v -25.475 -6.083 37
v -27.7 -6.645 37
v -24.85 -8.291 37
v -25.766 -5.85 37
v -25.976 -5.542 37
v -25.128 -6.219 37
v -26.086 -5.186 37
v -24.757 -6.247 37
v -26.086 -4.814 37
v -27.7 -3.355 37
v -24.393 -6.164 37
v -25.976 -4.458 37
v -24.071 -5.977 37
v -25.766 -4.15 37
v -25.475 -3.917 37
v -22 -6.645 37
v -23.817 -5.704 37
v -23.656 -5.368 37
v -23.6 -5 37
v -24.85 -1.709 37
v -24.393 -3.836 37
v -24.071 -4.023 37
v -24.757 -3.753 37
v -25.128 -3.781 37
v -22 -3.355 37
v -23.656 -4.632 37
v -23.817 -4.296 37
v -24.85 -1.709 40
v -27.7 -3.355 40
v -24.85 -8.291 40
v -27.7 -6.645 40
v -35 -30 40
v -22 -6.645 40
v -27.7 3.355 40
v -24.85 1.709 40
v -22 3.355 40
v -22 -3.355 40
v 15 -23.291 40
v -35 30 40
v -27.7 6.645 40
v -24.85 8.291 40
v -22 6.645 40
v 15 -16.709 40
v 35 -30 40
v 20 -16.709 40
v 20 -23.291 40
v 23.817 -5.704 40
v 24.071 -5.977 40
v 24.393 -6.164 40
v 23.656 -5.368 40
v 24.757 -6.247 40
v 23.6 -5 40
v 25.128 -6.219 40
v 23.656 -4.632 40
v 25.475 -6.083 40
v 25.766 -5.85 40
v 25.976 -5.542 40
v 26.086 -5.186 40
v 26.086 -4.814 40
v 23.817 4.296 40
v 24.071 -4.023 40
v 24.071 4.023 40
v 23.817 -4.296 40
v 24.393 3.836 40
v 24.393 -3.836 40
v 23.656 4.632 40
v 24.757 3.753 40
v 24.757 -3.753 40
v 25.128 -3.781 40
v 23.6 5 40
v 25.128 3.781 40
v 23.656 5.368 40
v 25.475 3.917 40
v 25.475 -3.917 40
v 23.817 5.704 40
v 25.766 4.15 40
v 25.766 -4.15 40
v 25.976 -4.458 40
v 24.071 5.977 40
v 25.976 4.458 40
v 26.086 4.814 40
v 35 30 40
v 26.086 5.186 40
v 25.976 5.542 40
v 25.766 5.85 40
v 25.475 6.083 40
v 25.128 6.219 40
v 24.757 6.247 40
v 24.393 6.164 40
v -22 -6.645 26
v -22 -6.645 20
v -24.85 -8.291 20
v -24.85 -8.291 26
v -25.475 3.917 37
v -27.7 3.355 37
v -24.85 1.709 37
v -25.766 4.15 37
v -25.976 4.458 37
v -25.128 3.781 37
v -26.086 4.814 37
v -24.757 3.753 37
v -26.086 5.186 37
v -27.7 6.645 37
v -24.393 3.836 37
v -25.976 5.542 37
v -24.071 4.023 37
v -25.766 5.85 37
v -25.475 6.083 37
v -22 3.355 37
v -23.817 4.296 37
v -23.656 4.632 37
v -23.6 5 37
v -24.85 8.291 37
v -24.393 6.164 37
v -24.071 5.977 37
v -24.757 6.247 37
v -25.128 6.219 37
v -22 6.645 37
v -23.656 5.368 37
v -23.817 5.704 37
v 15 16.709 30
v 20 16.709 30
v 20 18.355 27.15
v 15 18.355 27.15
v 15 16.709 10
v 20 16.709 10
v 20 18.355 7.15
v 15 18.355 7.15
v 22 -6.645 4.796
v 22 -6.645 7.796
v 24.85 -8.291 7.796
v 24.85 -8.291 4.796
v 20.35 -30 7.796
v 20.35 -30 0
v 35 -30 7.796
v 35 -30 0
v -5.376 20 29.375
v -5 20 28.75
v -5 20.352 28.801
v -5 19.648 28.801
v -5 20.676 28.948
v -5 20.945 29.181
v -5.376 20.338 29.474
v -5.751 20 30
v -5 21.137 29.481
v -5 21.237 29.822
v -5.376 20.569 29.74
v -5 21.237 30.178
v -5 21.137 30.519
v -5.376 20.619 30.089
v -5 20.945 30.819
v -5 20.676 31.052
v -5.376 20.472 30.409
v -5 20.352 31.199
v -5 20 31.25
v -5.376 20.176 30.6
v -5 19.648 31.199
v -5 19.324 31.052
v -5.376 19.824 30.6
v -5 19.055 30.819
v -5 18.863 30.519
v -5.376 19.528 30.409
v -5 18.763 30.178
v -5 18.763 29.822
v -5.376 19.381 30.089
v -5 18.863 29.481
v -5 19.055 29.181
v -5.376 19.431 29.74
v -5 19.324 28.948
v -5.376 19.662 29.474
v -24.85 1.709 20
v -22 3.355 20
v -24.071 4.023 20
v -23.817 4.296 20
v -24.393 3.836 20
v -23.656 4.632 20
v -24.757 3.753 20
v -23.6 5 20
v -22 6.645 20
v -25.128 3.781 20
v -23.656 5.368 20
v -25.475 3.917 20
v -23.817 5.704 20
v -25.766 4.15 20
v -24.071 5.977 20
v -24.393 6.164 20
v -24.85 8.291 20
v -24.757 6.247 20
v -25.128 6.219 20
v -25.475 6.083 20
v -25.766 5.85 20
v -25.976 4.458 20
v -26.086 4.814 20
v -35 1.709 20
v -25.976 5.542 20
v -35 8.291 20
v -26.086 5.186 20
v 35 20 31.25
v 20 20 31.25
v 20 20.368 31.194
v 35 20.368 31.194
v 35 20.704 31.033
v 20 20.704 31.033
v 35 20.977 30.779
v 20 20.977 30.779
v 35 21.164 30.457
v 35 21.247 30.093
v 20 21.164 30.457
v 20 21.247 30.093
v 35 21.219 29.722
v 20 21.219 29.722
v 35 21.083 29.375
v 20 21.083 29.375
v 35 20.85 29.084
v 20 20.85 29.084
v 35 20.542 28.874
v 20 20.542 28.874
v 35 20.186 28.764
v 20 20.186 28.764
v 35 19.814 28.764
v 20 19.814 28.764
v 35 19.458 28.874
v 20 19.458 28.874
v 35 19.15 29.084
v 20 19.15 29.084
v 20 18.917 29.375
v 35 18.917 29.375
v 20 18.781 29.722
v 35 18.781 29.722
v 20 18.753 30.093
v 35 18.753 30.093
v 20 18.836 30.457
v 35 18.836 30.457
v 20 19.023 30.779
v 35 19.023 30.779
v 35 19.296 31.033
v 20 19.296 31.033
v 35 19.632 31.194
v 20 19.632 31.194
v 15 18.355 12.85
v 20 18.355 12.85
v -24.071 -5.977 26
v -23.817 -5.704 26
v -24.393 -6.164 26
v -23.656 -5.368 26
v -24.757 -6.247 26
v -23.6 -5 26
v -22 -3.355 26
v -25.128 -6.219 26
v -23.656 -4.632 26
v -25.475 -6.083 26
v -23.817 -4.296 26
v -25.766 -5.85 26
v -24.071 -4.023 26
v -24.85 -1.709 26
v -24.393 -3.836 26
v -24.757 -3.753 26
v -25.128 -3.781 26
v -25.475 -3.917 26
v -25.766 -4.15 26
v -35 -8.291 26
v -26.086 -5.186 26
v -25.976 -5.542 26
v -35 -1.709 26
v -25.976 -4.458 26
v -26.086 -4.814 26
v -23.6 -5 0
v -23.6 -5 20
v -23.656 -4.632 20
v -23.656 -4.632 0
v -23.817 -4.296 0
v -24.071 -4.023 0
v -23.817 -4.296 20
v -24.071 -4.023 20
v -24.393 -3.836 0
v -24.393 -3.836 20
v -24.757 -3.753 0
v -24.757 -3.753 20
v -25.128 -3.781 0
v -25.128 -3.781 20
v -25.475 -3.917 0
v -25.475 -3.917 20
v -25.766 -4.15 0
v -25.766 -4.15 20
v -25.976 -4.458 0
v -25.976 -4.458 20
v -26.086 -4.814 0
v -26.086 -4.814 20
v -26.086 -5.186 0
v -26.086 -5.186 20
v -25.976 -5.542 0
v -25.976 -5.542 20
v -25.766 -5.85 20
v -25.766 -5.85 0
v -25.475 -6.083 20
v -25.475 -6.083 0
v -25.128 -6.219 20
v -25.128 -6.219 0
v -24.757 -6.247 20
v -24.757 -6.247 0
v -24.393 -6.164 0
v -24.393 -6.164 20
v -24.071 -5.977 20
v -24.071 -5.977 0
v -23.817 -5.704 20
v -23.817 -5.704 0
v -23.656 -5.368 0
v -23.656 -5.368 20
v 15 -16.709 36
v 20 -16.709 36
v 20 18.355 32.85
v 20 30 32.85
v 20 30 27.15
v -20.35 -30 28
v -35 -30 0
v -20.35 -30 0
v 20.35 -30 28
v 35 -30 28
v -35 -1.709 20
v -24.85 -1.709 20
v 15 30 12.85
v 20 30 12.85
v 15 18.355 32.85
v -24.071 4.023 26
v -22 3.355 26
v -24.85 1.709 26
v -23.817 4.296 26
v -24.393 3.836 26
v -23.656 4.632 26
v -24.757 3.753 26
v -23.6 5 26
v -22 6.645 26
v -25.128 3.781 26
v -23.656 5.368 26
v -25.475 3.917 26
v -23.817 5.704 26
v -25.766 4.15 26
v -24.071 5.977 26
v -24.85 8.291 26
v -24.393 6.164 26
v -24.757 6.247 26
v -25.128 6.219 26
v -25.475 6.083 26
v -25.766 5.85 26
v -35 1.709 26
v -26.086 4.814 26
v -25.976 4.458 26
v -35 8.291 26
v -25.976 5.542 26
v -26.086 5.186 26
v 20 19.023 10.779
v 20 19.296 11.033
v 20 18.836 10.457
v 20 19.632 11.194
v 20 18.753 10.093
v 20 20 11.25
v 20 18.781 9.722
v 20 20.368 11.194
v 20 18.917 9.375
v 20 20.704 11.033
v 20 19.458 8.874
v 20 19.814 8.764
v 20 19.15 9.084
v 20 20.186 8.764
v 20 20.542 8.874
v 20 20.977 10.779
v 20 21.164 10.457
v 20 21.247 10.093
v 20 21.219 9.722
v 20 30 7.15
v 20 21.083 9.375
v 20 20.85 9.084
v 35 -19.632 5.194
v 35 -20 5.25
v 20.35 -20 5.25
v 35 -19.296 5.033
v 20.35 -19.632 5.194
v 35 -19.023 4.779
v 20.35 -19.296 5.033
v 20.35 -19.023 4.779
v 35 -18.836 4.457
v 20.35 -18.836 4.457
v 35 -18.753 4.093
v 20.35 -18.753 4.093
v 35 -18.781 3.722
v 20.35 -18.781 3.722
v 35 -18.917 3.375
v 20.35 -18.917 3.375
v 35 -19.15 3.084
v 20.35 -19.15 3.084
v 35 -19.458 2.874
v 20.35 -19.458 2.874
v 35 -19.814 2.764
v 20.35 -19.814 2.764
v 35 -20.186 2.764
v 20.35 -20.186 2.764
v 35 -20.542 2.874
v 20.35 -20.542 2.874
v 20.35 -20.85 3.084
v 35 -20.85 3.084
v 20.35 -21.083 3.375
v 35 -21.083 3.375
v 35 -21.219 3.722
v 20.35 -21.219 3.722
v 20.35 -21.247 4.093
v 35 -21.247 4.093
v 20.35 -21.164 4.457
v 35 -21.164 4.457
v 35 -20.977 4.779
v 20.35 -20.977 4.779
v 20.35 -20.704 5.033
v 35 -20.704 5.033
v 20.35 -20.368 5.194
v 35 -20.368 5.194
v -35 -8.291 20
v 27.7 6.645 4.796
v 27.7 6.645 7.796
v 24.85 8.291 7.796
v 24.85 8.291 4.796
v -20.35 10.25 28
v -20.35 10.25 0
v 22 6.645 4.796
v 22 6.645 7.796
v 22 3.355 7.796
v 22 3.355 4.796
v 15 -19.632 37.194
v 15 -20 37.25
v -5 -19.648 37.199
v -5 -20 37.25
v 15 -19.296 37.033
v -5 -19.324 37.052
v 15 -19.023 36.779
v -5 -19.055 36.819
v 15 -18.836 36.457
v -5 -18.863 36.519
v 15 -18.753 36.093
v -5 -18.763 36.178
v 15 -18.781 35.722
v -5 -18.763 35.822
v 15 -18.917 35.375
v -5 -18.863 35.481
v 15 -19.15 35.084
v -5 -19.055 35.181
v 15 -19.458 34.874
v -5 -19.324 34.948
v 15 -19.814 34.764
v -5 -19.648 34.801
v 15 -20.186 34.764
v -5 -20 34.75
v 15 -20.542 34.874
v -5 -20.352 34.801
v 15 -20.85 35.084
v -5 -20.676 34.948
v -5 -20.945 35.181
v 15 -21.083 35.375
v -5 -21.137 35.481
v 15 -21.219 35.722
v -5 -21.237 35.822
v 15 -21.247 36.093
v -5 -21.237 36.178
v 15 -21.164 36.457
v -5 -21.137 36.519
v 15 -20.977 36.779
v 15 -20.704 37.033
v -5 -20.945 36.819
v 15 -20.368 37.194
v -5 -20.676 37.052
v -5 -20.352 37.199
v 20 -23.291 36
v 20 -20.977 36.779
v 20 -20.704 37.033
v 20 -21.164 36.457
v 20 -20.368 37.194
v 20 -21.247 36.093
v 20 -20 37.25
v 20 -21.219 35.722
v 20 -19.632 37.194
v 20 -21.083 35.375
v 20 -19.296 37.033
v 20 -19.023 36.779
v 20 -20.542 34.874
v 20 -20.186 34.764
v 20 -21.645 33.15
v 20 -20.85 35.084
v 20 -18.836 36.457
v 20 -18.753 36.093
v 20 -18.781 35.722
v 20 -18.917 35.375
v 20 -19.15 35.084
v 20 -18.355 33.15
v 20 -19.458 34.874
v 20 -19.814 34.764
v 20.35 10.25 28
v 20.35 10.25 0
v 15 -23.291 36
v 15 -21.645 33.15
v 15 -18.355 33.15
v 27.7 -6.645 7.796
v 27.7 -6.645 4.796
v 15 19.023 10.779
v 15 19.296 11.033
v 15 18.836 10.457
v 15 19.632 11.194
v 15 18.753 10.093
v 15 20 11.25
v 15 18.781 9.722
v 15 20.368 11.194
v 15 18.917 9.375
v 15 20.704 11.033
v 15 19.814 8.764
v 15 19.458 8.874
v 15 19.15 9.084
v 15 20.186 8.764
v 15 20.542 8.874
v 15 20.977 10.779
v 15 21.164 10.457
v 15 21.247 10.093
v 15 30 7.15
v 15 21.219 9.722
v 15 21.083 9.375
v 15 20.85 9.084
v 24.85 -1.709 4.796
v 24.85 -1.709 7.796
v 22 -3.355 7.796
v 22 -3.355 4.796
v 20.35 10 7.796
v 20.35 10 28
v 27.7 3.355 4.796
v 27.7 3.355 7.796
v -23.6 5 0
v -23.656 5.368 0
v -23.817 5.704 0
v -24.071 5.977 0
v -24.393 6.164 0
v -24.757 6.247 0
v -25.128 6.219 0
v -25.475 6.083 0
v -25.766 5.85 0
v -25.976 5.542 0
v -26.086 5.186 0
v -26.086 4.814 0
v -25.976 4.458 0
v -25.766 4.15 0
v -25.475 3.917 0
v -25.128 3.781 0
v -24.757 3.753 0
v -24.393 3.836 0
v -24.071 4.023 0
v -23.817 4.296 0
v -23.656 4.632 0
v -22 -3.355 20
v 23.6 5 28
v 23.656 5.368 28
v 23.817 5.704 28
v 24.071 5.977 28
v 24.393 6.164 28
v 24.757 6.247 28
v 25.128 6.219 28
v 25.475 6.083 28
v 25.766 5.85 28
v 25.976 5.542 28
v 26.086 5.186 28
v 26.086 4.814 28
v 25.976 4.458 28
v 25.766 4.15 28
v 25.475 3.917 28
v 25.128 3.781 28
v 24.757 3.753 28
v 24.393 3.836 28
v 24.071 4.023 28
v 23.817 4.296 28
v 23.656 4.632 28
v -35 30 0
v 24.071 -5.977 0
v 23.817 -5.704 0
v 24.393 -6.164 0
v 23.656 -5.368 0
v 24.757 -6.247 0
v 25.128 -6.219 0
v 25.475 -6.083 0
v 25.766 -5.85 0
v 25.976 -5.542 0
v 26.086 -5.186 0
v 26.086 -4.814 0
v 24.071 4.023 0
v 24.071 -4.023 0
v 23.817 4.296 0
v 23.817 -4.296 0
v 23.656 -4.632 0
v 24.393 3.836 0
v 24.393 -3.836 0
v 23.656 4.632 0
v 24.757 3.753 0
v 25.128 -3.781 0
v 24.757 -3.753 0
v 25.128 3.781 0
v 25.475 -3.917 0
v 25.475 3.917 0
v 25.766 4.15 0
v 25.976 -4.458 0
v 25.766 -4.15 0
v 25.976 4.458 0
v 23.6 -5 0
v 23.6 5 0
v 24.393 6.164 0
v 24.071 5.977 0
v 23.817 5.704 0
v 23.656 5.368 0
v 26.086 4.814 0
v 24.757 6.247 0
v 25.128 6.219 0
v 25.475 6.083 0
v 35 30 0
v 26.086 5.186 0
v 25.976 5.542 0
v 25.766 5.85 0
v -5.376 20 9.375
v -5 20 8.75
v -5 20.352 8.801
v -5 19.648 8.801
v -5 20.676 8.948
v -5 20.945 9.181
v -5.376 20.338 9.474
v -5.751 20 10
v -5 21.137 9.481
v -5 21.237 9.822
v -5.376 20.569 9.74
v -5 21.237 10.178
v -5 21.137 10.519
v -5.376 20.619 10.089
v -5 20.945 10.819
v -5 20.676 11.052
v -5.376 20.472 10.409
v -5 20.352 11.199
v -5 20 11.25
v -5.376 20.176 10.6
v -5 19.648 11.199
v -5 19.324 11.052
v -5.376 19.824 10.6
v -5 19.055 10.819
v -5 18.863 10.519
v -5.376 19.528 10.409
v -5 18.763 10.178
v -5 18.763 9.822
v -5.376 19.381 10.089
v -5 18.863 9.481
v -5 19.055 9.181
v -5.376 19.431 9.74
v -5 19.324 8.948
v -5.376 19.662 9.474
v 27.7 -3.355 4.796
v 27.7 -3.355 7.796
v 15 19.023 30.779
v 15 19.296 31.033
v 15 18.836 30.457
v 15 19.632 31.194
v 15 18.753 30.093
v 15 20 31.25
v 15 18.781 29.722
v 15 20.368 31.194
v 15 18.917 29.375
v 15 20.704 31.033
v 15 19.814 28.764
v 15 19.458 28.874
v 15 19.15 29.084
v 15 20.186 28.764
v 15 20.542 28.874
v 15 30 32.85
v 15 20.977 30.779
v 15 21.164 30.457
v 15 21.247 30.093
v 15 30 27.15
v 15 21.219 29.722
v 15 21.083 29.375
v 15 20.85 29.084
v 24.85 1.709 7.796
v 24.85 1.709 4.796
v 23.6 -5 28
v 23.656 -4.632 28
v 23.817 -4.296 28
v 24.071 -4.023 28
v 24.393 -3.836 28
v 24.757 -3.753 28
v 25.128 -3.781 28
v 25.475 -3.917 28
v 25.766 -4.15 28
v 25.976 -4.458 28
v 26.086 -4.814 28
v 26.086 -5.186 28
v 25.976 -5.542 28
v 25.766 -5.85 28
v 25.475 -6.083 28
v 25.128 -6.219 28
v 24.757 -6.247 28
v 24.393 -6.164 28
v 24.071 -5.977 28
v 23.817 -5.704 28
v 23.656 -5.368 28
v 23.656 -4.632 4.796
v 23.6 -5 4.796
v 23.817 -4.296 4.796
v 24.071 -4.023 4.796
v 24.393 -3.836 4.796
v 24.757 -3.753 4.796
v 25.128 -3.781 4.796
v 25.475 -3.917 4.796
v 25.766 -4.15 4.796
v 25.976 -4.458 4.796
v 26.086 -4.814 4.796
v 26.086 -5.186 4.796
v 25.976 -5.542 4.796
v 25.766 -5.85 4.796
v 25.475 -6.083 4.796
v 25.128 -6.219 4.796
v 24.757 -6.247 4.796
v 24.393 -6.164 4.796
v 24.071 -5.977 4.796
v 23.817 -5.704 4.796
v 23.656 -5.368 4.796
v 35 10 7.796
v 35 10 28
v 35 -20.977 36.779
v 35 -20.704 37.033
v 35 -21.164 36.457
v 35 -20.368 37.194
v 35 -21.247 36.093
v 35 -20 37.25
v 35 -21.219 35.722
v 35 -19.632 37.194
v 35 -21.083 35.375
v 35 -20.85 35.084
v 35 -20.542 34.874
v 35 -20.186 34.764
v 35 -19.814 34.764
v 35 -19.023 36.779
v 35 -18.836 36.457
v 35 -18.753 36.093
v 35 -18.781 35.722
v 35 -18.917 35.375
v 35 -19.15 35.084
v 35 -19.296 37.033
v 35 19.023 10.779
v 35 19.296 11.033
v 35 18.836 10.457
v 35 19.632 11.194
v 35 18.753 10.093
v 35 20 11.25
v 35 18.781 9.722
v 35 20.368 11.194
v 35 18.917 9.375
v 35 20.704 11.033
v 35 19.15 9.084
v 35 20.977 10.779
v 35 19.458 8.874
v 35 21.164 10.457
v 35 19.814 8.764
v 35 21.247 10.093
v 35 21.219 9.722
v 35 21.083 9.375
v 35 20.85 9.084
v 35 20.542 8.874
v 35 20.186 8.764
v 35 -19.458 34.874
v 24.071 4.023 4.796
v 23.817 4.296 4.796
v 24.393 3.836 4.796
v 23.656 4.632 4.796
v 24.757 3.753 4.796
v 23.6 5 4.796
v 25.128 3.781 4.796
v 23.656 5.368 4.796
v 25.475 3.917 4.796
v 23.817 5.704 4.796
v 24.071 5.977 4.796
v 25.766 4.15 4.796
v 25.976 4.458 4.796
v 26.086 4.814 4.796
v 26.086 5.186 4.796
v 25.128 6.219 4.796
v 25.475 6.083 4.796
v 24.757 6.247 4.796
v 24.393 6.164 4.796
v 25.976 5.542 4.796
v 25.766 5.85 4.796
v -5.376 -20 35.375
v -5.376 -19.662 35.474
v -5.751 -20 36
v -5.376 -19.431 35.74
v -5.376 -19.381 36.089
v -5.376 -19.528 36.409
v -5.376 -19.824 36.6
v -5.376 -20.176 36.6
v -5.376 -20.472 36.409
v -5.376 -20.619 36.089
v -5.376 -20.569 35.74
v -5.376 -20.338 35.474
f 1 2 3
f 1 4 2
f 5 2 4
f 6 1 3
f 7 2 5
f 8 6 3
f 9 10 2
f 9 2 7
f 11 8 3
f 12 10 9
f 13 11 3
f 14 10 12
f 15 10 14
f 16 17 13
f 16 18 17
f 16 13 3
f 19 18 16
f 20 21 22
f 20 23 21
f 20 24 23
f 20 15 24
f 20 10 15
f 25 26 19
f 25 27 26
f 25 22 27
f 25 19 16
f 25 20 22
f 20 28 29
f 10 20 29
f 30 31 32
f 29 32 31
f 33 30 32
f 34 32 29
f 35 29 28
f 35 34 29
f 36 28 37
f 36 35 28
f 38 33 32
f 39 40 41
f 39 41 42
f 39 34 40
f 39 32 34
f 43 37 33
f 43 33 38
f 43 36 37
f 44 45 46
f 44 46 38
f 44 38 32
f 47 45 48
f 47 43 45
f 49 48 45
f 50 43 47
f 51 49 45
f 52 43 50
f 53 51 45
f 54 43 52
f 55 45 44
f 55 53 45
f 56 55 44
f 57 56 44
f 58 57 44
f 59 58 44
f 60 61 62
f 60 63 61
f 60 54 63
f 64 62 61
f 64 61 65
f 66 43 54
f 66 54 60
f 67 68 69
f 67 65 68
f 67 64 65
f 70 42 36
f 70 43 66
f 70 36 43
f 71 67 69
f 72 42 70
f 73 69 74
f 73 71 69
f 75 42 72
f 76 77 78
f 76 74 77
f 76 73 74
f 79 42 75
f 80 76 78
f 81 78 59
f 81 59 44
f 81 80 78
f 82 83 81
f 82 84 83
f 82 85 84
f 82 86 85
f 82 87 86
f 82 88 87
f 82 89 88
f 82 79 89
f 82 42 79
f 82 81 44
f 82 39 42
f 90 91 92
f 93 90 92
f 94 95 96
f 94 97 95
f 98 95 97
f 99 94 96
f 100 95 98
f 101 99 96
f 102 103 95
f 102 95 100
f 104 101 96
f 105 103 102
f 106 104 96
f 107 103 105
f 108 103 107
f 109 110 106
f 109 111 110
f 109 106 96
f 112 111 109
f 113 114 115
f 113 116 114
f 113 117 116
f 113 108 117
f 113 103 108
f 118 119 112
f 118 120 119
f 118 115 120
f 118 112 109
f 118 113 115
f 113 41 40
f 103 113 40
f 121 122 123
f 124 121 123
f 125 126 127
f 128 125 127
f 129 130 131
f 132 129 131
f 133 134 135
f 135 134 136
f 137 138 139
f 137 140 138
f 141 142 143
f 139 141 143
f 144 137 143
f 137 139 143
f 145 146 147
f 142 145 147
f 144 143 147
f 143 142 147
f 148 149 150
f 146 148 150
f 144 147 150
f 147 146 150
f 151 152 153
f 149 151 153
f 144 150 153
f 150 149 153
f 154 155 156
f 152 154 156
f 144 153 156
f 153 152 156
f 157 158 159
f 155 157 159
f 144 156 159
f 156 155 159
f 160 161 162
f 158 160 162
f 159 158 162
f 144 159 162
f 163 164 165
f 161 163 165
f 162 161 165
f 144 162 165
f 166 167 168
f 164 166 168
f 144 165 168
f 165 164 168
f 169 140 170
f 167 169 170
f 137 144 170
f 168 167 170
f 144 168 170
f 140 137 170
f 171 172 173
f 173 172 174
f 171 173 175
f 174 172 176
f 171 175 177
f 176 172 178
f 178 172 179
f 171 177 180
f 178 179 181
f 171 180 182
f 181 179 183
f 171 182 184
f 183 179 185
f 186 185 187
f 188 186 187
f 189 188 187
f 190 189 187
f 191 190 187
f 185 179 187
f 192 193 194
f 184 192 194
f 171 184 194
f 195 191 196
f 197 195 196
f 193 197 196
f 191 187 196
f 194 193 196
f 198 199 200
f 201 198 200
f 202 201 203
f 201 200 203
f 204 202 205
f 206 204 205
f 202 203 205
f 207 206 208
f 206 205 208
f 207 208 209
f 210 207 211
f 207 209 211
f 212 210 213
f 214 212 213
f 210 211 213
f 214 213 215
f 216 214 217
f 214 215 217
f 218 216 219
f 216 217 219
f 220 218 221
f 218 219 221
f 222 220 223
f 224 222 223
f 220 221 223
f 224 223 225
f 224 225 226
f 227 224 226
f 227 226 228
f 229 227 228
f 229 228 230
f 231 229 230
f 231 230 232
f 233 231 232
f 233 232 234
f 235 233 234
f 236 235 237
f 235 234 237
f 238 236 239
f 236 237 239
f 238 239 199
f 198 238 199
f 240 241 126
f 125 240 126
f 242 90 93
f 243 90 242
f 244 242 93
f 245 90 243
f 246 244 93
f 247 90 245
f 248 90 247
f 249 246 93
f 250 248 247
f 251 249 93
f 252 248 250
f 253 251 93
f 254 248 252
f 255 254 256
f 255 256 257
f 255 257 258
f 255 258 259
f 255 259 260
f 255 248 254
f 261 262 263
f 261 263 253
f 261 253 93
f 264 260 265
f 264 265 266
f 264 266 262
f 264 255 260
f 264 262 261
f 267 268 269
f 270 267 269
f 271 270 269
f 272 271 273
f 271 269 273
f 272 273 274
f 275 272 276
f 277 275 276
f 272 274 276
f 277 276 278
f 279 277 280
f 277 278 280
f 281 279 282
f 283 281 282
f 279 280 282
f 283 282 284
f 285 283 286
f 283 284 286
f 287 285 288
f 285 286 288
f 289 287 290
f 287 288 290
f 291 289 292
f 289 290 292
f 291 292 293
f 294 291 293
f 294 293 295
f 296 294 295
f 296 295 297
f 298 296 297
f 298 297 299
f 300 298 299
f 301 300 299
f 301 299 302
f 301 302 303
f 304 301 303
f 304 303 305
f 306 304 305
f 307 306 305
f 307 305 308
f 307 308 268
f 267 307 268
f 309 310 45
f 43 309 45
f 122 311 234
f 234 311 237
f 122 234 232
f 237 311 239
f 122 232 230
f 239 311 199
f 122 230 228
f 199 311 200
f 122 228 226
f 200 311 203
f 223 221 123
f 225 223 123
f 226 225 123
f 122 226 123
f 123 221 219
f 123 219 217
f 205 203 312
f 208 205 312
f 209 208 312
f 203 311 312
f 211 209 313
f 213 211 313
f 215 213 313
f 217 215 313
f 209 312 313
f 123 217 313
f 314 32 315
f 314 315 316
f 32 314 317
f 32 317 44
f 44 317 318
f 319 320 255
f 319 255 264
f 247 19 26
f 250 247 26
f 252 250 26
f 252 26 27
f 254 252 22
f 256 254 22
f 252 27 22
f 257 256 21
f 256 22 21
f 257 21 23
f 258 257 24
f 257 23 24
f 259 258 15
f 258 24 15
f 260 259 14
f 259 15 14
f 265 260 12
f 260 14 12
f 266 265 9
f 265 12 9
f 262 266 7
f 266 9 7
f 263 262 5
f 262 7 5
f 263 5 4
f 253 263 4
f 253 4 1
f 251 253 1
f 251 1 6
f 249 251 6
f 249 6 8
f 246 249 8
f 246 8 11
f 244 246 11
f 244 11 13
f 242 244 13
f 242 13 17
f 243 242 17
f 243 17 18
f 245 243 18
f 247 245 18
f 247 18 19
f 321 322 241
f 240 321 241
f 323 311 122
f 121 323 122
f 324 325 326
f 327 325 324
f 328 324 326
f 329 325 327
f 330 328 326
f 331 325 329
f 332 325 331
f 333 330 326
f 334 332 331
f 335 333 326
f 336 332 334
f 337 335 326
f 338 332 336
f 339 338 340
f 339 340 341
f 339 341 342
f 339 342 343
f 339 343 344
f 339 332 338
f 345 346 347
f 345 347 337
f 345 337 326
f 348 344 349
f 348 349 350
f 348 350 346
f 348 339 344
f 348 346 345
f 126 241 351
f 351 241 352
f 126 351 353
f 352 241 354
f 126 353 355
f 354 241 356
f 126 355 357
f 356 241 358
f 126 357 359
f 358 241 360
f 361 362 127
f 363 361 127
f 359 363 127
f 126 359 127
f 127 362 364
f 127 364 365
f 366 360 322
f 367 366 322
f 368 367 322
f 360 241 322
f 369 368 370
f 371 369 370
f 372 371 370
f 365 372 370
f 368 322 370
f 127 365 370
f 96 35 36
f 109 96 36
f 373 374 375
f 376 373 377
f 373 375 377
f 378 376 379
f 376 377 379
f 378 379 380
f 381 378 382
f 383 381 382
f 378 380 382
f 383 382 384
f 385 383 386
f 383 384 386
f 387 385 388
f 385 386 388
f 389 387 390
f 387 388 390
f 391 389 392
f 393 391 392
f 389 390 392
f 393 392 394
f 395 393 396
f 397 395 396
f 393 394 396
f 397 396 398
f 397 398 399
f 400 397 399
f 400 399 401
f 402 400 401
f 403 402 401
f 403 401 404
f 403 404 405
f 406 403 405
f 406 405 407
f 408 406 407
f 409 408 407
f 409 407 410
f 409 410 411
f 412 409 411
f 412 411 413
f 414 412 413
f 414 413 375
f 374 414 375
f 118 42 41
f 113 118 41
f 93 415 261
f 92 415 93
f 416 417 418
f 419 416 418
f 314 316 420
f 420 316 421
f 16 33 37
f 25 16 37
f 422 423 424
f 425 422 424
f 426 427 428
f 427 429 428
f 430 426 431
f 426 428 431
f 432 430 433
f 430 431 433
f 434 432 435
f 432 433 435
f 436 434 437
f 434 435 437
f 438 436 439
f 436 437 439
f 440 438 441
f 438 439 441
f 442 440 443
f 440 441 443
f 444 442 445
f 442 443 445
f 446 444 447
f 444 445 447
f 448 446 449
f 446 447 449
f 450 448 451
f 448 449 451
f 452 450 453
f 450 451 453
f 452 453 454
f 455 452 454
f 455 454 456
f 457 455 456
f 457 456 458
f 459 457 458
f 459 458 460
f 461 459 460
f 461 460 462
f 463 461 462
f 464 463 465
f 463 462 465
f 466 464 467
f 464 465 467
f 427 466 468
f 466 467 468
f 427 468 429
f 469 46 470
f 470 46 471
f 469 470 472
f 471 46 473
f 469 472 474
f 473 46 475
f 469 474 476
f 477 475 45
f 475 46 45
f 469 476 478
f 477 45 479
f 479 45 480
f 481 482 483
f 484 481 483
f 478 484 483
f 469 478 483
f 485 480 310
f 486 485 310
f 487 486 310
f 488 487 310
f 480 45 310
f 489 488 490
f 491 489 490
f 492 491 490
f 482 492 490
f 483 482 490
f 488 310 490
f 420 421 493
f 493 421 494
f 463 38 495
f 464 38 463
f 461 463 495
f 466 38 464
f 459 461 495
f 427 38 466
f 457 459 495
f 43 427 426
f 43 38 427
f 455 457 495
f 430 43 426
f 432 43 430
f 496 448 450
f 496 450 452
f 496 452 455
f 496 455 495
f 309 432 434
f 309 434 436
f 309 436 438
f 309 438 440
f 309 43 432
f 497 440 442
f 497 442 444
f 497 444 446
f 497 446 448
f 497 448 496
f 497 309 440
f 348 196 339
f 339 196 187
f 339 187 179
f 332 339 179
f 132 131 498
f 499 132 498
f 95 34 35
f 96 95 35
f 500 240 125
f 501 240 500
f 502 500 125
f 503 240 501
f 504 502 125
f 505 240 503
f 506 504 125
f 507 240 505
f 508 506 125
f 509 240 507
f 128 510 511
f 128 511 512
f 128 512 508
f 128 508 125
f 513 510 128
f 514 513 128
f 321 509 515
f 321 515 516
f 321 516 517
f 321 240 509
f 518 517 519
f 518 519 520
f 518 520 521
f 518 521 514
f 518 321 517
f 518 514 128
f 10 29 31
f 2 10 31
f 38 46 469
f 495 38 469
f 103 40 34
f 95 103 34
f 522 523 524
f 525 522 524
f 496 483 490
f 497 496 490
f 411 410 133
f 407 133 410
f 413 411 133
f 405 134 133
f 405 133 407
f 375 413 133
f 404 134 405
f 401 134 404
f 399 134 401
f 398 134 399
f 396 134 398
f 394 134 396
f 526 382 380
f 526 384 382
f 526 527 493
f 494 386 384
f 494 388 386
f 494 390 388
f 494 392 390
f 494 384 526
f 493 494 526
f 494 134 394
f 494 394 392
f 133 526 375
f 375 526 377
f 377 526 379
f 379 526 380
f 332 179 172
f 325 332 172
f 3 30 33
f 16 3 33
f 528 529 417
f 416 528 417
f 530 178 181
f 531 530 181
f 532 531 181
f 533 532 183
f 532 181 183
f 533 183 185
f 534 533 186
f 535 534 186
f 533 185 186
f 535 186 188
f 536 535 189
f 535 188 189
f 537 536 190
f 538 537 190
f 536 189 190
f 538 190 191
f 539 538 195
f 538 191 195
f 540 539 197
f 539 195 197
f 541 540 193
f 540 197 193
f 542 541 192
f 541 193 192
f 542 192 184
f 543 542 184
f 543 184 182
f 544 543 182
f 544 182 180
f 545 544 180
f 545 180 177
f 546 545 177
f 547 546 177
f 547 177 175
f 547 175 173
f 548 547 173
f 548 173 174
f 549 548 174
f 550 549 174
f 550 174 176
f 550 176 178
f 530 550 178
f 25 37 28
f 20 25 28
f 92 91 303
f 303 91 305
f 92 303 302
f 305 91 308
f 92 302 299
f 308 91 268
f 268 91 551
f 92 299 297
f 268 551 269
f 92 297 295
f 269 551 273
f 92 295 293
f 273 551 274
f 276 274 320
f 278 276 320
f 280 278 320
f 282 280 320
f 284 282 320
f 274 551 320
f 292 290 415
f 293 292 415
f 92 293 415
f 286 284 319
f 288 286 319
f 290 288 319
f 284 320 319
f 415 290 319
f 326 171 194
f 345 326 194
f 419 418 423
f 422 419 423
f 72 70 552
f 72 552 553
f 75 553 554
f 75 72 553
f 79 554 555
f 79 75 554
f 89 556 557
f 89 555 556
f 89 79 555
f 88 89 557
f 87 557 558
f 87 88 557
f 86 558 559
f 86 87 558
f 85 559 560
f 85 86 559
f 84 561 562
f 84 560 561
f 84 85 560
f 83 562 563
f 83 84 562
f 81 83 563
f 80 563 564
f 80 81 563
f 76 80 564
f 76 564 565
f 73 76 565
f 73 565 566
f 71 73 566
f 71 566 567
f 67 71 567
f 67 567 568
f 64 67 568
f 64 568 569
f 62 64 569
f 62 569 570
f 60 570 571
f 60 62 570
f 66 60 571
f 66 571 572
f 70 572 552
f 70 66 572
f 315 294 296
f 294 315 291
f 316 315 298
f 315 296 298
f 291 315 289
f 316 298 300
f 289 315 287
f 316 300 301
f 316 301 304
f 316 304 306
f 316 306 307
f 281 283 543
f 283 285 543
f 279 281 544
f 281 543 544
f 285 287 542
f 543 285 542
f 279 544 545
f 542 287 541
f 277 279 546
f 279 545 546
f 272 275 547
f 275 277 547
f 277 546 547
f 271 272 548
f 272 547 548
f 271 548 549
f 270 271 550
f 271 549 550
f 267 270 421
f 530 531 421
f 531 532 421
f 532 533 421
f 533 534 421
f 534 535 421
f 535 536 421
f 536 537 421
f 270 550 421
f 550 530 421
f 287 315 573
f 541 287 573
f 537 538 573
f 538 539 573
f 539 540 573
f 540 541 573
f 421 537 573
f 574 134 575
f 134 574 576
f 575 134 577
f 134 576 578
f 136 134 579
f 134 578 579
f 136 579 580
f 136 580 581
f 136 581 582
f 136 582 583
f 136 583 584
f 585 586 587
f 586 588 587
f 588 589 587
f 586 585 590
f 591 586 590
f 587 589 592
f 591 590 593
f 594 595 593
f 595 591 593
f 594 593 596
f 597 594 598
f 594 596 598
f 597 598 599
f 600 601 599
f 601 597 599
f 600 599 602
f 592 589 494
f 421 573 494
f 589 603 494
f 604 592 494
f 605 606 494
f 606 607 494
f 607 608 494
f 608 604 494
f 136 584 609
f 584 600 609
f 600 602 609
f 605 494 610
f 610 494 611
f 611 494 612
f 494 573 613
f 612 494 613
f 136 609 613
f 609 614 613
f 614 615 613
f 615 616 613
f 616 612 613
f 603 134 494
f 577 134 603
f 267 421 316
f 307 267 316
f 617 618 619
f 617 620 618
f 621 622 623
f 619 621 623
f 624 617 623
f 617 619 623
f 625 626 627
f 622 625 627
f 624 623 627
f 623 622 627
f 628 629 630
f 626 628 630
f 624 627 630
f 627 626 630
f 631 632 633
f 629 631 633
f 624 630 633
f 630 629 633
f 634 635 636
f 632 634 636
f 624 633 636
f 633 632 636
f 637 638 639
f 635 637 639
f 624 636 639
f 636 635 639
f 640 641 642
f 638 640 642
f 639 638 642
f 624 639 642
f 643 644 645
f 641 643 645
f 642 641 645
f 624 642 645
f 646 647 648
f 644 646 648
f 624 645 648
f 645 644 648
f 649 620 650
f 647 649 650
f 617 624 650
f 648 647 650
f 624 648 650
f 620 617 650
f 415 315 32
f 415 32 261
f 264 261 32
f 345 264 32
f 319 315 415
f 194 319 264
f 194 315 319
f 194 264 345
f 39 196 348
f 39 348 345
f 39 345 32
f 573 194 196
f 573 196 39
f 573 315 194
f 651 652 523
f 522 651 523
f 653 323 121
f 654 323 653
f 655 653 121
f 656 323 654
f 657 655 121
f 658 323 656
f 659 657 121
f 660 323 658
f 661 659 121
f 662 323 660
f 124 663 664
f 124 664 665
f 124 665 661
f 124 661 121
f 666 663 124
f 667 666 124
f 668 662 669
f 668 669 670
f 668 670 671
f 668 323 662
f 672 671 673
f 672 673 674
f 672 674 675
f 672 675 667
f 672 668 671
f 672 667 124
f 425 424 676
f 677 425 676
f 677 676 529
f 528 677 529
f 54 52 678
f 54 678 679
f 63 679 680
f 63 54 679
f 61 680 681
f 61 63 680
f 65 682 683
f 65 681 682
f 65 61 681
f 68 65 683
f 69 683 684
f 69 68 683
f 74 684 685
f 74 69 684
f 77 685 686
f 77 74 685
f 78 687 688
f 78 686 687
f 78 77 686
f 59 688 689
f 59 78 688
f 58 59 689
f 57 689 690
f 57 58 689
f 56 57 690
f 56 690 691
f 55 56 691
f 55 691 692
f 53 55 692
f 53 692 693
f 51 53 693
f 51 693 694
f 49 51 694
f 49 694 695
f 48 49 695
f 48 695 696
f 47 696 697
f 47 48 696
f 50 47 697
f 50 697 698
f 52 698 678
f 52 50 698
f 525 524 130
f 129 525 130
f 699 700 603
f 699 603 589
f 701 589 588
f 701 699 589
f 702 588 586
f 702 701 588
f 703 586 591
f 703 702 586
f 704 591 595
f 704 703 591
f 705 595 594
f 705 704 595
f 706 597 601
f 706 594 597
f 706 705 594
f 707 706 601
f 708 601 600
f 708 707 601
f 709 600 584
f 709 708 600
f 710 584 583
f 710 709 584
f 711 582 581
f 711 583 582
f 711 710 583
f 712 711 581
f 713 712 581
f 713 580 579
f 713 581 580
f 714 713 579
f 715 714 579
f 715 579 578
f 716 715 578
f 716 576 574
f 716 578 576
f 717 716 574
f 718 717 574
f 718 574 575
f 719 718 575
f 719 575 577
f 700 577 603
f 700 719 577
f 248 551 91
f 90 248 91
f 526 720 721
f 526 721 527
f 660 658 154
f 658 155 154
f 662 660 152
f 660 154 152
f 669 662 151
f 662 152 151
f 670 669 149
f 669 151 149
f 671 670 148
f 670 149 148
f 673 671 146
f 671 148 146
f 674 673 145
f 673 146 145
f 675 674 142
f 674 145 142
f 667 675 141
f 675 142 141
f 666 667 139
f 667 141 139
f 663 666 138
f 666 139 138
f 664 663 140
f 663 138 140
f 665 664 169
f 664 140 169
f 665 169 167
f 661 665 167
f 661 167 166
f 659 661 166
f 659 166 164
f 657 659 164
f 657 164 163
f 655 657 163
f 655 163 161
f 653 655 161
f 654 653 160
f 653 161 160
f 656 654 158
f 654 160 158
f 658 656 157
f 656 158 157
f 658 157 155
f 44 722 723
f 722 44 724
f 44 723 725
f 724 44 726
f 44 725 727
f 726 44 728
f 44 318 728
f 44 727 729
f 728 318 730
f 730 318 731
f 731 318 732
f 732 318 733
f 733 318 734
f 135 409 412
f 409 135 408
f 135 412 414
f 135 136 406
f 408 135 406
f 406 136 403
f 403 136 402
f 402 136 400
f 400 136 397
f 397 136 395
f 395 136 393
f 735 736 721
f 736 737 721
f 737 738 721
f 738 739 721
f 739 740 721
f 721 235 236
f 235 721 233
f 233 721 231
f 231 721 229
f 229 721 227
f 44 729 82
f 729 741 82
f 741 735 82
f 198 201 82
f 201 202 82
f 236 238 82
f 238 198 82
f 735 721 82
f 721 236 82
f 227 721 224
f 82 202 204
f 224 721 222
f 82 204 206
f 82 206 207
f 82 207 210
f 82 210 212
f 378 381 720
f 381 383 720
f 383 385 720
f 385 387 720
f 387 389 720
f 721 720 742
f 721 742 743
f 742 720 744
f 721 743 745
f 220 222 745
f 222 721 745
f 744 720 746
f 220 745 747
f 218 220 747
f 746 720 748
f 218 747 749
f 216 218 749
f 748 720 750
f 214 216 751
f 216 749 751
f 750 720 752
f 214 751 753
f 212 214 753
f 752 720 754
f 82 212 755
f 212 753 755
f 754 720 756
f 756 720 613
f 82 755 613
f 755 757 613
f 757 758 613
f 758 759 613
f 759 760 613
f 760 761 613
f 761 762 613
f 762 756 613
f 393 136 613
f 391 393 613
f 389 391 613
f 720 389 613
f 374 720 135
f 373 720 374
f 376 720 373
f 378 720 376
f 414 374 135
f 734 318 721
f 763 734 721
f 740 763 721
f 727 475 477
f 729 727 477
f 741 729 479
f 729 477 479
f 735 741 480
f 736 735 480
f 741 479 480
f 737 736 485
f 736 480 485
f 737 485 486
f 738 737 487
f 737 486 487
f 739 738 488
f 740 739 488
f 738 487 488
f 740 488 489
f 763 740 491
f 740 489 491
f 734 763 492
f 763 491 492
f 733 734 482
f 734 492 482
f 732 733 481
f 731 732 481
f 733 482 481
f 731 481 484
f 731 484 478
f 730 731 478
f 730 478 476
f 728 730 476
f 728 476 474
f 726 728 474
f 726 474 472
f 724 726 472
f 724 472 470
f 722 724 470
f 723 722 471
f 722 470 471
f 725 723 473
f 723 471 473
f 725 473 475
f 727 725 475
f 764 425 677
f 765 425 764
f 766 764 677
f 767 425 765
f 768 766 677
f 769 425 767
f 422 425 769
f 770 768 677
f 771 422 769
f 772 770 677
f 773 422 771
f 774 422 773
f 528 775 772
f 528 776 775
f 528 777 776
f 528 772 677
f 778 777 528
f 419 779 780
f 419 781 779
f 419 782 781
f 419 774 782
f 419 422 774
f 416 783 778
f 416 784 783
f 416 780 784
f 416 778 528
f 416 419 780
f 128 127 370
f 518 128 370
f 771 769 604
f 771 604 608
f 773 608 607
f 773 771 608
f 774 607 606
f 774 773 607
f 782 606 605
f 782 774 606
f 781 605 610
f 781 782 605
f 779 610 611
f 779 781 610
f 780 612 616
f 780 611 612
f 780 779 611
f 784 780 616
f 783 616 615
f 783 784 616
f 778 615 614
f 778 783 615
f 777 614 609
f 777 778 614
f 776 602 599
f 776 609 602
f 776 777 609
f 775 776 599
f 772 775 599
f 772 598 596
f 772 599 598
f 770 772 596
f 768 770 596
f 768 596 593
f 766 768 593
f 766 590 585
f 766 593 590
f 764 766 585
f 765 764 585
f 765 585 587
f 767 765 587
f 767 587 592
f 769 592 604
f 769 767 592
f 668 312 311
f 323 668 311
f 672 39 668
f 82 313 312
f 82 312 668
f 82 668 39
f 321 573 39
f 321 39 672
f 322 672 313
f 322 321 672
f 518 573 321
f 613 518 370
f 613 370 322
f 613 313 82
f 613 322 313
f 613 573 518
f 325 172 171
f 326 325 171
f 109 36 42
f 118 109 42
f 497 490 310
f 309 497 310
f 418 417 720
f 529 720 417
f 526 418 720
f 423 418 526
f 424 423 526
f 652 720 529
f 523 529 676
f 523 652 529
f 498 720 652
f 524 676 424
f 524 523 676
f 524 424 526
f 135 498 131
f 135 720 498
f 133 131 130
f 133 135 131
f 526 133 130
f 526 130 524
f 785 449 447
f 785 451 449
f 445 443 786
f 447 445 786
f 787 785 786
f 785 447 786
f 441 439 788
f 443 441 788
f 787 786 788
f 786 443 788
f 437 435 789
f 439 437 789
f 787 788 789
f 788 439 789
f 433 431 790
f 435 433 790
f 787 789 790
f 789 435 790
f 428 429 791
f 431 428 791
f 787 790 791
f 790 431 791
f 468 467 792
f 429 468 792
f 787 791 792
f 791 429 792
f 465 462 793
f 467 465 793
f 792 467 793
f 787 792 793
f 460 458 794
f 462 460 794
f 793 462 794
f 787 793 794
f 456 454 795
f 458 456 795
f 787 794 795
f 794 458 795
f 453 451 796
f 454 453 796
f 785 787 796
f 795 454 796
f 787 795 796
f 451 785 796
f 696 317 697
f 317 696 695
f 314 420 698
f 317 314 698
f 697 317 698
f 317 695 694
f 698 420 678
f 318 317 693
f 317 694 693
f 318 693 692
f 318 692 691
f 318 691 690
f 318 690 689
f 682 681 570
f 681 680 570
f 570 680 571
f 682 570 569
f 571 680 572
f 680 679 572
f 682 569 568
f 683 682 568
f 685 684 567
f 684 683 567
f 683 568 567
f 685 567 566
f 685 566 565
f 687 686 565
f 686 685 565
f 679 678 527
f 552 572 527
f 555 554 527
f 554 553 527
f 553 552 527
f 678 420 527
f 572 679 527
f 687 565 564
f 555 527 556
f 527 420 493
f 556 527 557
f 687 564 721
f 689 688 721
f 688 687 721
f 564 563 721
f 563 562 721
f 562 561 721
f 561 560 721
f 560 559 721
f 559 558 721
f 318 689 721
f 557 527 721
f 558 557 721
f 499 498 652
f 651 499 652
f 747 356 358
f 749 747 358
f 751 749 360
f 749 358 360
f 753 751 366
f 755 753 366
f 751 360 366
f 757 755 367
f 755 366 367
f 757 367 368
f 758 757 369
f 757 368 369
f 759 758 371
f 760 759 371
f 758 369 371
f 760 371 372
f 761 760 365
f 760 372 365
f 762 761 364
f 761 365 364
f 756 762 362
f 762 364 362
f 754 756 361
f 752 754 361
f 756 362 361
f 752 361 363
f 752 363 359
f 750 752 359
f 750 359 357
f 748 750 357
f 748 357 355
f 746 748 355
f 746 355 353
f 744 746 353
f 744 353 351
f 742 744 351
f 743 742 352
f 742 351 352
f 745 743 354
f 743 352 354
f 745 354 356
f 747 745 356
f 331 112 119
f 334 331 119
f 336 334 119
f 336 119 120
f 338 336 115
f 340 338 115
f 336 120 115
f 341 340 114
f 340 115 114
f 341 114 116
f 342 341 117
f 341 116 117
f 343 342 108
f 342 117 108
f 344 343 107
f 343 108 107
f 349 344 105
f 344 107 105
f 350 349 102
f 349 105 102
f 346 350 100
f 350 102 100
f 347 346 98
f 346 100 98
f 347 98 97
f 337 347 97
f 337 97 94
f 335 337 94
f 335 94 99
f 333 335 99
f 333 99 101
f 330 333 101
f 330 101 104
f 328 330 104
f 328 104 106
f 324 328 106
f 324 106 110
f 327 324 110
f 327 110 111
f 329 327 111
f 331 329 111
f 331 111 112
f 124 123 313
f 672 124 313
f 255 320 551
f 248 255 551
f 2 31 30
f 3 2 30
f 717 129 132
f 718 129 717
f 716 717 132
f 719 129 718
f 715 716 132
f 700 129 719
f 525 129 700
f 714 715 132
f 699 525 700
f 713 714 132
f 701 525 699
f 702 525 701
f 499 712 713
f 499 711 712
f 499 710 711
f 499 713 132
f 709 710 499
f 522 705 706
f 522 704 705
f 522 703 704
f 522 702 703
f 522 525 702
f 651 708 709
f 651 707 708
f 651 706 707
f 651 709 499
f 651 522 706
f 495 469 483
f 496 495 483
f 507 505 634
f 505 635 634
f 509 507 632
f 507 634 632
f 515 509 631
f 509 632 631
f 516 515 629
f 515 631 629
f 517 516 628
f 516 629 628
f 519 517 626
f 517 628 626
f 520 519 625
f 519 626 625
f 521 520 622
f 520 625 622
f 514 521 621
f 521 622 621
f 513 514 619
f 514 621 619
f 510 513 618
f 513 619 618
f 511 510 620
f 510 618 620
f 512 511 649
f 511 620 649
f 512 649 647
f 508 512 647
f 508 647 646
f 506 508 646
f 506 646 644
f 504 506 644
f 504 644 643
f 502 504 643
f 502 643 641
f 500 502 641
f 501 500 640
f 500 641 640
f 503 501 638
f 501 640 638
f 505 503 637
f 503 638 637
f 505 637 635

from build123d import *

# Parameters (mm, degrees)
SKETCH_2_W           = 70
SKETCH_2_H           = 60
EXTRUDE_2_DEPTH      = 40
SKETCH_3_W           = 40.7
SKETCH_3_H           = 20.5
CUT_EXTRUDE_1_DEPTH  = 28
SKETCH_4_W           = 14.65
SKETCH_4_H           = 20.5
EXTRUDE_3_DEPTH      = 28
SKETCH_15_W          = 40.7
SKETCH_15_H          = 40.25
CUT_EXTRUDE_6_DEPTH  = 28
SKETCH_16_W          = 14.65
SKETCH_16_H          = 20.204149113
CUT_EXTRUDE_7_DEPTH  = 40
M3X0_5_2_D           = 2.5
CUT_EXTRUDE_8_DEPTH  = 3
CUT_EXTRUDE_9_DEPTH  = 3
CUT_EXTRUDE_10_DEPTH = 6
M3X0_5_3_D           = 2.5
M3X0_5_3_DEPTH       = 40
M3X0_5_3_TIP         = 0.751075774
CUT_EXTRUDE_12_DEPTH = 5


with BuildPart() as part:
    # ｽｹｯﾁ2 → ﾎﾞｽ - 押し出し2 (new body)
    with BuildSketch(Plane.XY):
        Rectangle(SKETCH_2_W, SKETCH_2_H)
    extrude(amount=EXTRUDE_2_DEPTH)

    # ｽｹｯﾁ3 → ｶｯﾄ - 押し出し1 (cut)
    with BuildSketch(Plane.XY):
        Rectangle(SKETCH_3_W, SKETCH_3_H)
    extrude(amount=CUT_EXTRUDE_1_DEPTH, mode=Mode.SUBTRACT)

    # ｽｹｯﾁ4 → ﾎﾞｽ - 押し出し3 (add)
    with BuildSketch(Plane.XY):
        with Locations((27.675, 0)):
            Rectangle(SKETCH_4_W, SKETCH_4_H)
    extrude(amount=EXTRUDE_3_DEPTH)

    # ｽｹｯﾁ15 → ｶｯﾄ - 押し出し6 (cut)
    with BuildSketch(Plane.XY):
        with Locations((0, -9.875)):
            Rectangle(SKETCH_15_W, SKETCH_15_H)
    extrude(amount=CUT_EXTRUDE_6_DEPTH, mode=Mode.SUBTRACT)

    # ｽｹｯﾁ16 → ｶｯﾄ - 押し出し7 (cut)
    with BuildSketch(Plane(origin=(0, -30, 0), x_dir=(-1, 0, 0), z_dir=(0, -1, 0))):
        with Locations((-27.675, -17.897925444)):
            Rectangle(SKETCH_16_W, SKETCH_16_H)
    extrude(amount=-CUT_EXTRUDE_7_DEPTH, mode=Mode.SUBTRACT)

    # M3x0.5 ねじ穴2 (through all)
    with Locations(Plane(origin=(0, 0, 0), x_dir=(-1, 0, 0), z_dir=(0, 0, -1))):
        with Locations((24.85, 5), (24.85, -5)):
            m3x0_5_2 = Hole(M3X0_5_2_D / 2)

    # ﾐﾗｰ1: M3x0.5 ねじ穴2 across plane
    add(m3x0_5_2.mirror(Plane(origin=(0, 0, 0), x_dir=(0, 0, 1), z_dir=(1, 0, 0))), mode=Mode.SUBTRACT)

    # ｽｹｯﾁ17 → ｶｯﾄ - 押し出し8 (cut)
    with BuildSketch(Plane.XY.offset(40)):
        Polygon((-24.85, 8.290896534), (-27.7, 6.645448267), (-27.7, 3.354551733), (-24.85, 1.709103466), (-22, 3.354551733), (-22, 6.645448267), align=None)
        Polygon((-22, -6.645448267), (-22, -3.354551733), (-24.85, -1.709103466), (-27.7, -3.354551733), (-27.7, -6.645448267), (-24.85, -8.290896534), align=None)
    extrude(amount=-CUT_EXTRUDE_8_DEPTH, mode=Mode.SUBTRACT)

    # ｽｹｯﾁ18 → ｶｯﾄ - 押し出し9 (cut)
    with BuildSketch(Plane.XY.offset(7.795850887)):
        Polygon((27.7, 3.354551733), (27.7, 6.645448267), (24.85, 8.290896534), (22, 6.645448267), (22, 3.354551733), (24.85, 1.709103466), align=None)
        Polygon((27.7, -6.645448267), (27.7, -3.354551733), (24.85, -1.709103466), (22, -3.354551733), (22, -6.645448267), (24.85, -8.290896534), align=None)
    extrude(amount=-CUT_EXTRUDE_9_DEPTH, mode=Mode.SUBTRACT)

    # ｽｹｯﾁ19 → ｶｯﾄ - 押し出し10 (cut)
    with BuildSketch(Plane(origin=(0, 0, 20), x_dir=(-1, 0, 0), z_dir=(0, 0, -1))):
        Polygon((35, 1.709103466), (35, 8.290896534), (24.85, 8.290896534), (27.7, 6.645448267), (27.7, 3.354551733), (24.85, 1.709103466), align=None)
        Polygon((22, 6.645448267), (22, 3.354551733), (24.85, 1.709103466), (27.7, 3.354551733), (27.7, 6.645448267), (24.85, 8.290896534), align=None)
        Polygon((22, -6.645448267), (24.85, -8.290896534), (27.7, -6.645448267), (27.7, -3.354551733), (24.85, -1.709103466), (22, -3.354551733), align=None)
        Polygon((35, -8.290896534), (24.85, -8.290896534), (27.7, -6.645448267), (27.7, -3.354551733), (24.85, -1.709103466), (35, -1.709103466), align=None)
    extrude(amount=-CUT_EXTRUDE_10_DEPTH, mode=Mode.SUBTRACT)

    # M3x0.5 ねじ穴3
    with Locations(Plane(origin=(35, 0, 0), x_dir=(0, 0, -1), z_dir=(1, 0, 0))):
        with Locations((-4, -20), (-36, -20), (-10, 20), (-30, 20)):
            Hole(M3X0_5_3_D / 2, depth=M3X0_5_3_DEPTH)
            with Locations((0, 0, -(M3X0_5_3_DEPTH + M3X0_5_3_TIP / 2))):  # 118° drill point
                Cone(0, M3X0_5_3_D / 2, M3X0_5_3_TIP, mode=Mode.SUBTRACT)

    # ｽｹｯﾁ24 → ｶｯﾄ - 押し出し12 (cut)
    with BuildSketch(Plane(origin=(20, 0, 0), x_dir=(0, 0, -1), z_dir=(1, 0, 0))):
        Polygon((-38.85, -18.354551733), (-38.85, -21.645448267), (-36, -23.290896534), (-33.15, -21.645448267), (-33.15, -18.354551733), (-36, -16.709103466), align=None)
        Polygon((-40, -16.709103466), (-40, -23.290896534), (-36, -23.290896534), (-38.85, -21.645448267), (-38.85, -18.354551733), (-36, -16.709103466), align=None)
        Polygon((-6.85, -18.354551733), (-6.85, -21.645448267), (-4, -23.290896534), (-1.15, -21.645448267), (-1.15, -18.354551733), (-4, -16.709103466), align=None)
        Polygon((-10, 23.290896534), (-7.15, 21.645448267), (-7.15, 30), (-12.85, 30), (-12.85, 21.645448267), align=None)
        Polygon((-12.85, 21.645448267), (-12.85, 18.354551733), (-10, 16.709103466), (-7.15, 18.354551733), (-7.15, 21.645448267), (-10, 23.290896534), align=None)
        Polygon((-32.85, 21.645448267), (-32.85, 18.354551733), (-30, 16.709103466), (-27.15, 18.354551733), (-27.15, 21.645448267), (-30, 23.290896534), align=None)
        Polygon((-30, 23.290896534), (-27.15, 21.645448267), (-27.15, 30), (-32.85, 30), (-32.85, 21.645448267), align=None)
        Polygon((0, -23.290896534), (0, -16.709103466), (-4, -16.709103466), (-1.15, -18.354551733), (-1.15, -21.645448267), (-4, -23.290896534), align=None)
    extrude(amount=-CUT_EXTRUDE_12_DEPTH, mode=Mode.SUBTRACT)


solid = part.part
